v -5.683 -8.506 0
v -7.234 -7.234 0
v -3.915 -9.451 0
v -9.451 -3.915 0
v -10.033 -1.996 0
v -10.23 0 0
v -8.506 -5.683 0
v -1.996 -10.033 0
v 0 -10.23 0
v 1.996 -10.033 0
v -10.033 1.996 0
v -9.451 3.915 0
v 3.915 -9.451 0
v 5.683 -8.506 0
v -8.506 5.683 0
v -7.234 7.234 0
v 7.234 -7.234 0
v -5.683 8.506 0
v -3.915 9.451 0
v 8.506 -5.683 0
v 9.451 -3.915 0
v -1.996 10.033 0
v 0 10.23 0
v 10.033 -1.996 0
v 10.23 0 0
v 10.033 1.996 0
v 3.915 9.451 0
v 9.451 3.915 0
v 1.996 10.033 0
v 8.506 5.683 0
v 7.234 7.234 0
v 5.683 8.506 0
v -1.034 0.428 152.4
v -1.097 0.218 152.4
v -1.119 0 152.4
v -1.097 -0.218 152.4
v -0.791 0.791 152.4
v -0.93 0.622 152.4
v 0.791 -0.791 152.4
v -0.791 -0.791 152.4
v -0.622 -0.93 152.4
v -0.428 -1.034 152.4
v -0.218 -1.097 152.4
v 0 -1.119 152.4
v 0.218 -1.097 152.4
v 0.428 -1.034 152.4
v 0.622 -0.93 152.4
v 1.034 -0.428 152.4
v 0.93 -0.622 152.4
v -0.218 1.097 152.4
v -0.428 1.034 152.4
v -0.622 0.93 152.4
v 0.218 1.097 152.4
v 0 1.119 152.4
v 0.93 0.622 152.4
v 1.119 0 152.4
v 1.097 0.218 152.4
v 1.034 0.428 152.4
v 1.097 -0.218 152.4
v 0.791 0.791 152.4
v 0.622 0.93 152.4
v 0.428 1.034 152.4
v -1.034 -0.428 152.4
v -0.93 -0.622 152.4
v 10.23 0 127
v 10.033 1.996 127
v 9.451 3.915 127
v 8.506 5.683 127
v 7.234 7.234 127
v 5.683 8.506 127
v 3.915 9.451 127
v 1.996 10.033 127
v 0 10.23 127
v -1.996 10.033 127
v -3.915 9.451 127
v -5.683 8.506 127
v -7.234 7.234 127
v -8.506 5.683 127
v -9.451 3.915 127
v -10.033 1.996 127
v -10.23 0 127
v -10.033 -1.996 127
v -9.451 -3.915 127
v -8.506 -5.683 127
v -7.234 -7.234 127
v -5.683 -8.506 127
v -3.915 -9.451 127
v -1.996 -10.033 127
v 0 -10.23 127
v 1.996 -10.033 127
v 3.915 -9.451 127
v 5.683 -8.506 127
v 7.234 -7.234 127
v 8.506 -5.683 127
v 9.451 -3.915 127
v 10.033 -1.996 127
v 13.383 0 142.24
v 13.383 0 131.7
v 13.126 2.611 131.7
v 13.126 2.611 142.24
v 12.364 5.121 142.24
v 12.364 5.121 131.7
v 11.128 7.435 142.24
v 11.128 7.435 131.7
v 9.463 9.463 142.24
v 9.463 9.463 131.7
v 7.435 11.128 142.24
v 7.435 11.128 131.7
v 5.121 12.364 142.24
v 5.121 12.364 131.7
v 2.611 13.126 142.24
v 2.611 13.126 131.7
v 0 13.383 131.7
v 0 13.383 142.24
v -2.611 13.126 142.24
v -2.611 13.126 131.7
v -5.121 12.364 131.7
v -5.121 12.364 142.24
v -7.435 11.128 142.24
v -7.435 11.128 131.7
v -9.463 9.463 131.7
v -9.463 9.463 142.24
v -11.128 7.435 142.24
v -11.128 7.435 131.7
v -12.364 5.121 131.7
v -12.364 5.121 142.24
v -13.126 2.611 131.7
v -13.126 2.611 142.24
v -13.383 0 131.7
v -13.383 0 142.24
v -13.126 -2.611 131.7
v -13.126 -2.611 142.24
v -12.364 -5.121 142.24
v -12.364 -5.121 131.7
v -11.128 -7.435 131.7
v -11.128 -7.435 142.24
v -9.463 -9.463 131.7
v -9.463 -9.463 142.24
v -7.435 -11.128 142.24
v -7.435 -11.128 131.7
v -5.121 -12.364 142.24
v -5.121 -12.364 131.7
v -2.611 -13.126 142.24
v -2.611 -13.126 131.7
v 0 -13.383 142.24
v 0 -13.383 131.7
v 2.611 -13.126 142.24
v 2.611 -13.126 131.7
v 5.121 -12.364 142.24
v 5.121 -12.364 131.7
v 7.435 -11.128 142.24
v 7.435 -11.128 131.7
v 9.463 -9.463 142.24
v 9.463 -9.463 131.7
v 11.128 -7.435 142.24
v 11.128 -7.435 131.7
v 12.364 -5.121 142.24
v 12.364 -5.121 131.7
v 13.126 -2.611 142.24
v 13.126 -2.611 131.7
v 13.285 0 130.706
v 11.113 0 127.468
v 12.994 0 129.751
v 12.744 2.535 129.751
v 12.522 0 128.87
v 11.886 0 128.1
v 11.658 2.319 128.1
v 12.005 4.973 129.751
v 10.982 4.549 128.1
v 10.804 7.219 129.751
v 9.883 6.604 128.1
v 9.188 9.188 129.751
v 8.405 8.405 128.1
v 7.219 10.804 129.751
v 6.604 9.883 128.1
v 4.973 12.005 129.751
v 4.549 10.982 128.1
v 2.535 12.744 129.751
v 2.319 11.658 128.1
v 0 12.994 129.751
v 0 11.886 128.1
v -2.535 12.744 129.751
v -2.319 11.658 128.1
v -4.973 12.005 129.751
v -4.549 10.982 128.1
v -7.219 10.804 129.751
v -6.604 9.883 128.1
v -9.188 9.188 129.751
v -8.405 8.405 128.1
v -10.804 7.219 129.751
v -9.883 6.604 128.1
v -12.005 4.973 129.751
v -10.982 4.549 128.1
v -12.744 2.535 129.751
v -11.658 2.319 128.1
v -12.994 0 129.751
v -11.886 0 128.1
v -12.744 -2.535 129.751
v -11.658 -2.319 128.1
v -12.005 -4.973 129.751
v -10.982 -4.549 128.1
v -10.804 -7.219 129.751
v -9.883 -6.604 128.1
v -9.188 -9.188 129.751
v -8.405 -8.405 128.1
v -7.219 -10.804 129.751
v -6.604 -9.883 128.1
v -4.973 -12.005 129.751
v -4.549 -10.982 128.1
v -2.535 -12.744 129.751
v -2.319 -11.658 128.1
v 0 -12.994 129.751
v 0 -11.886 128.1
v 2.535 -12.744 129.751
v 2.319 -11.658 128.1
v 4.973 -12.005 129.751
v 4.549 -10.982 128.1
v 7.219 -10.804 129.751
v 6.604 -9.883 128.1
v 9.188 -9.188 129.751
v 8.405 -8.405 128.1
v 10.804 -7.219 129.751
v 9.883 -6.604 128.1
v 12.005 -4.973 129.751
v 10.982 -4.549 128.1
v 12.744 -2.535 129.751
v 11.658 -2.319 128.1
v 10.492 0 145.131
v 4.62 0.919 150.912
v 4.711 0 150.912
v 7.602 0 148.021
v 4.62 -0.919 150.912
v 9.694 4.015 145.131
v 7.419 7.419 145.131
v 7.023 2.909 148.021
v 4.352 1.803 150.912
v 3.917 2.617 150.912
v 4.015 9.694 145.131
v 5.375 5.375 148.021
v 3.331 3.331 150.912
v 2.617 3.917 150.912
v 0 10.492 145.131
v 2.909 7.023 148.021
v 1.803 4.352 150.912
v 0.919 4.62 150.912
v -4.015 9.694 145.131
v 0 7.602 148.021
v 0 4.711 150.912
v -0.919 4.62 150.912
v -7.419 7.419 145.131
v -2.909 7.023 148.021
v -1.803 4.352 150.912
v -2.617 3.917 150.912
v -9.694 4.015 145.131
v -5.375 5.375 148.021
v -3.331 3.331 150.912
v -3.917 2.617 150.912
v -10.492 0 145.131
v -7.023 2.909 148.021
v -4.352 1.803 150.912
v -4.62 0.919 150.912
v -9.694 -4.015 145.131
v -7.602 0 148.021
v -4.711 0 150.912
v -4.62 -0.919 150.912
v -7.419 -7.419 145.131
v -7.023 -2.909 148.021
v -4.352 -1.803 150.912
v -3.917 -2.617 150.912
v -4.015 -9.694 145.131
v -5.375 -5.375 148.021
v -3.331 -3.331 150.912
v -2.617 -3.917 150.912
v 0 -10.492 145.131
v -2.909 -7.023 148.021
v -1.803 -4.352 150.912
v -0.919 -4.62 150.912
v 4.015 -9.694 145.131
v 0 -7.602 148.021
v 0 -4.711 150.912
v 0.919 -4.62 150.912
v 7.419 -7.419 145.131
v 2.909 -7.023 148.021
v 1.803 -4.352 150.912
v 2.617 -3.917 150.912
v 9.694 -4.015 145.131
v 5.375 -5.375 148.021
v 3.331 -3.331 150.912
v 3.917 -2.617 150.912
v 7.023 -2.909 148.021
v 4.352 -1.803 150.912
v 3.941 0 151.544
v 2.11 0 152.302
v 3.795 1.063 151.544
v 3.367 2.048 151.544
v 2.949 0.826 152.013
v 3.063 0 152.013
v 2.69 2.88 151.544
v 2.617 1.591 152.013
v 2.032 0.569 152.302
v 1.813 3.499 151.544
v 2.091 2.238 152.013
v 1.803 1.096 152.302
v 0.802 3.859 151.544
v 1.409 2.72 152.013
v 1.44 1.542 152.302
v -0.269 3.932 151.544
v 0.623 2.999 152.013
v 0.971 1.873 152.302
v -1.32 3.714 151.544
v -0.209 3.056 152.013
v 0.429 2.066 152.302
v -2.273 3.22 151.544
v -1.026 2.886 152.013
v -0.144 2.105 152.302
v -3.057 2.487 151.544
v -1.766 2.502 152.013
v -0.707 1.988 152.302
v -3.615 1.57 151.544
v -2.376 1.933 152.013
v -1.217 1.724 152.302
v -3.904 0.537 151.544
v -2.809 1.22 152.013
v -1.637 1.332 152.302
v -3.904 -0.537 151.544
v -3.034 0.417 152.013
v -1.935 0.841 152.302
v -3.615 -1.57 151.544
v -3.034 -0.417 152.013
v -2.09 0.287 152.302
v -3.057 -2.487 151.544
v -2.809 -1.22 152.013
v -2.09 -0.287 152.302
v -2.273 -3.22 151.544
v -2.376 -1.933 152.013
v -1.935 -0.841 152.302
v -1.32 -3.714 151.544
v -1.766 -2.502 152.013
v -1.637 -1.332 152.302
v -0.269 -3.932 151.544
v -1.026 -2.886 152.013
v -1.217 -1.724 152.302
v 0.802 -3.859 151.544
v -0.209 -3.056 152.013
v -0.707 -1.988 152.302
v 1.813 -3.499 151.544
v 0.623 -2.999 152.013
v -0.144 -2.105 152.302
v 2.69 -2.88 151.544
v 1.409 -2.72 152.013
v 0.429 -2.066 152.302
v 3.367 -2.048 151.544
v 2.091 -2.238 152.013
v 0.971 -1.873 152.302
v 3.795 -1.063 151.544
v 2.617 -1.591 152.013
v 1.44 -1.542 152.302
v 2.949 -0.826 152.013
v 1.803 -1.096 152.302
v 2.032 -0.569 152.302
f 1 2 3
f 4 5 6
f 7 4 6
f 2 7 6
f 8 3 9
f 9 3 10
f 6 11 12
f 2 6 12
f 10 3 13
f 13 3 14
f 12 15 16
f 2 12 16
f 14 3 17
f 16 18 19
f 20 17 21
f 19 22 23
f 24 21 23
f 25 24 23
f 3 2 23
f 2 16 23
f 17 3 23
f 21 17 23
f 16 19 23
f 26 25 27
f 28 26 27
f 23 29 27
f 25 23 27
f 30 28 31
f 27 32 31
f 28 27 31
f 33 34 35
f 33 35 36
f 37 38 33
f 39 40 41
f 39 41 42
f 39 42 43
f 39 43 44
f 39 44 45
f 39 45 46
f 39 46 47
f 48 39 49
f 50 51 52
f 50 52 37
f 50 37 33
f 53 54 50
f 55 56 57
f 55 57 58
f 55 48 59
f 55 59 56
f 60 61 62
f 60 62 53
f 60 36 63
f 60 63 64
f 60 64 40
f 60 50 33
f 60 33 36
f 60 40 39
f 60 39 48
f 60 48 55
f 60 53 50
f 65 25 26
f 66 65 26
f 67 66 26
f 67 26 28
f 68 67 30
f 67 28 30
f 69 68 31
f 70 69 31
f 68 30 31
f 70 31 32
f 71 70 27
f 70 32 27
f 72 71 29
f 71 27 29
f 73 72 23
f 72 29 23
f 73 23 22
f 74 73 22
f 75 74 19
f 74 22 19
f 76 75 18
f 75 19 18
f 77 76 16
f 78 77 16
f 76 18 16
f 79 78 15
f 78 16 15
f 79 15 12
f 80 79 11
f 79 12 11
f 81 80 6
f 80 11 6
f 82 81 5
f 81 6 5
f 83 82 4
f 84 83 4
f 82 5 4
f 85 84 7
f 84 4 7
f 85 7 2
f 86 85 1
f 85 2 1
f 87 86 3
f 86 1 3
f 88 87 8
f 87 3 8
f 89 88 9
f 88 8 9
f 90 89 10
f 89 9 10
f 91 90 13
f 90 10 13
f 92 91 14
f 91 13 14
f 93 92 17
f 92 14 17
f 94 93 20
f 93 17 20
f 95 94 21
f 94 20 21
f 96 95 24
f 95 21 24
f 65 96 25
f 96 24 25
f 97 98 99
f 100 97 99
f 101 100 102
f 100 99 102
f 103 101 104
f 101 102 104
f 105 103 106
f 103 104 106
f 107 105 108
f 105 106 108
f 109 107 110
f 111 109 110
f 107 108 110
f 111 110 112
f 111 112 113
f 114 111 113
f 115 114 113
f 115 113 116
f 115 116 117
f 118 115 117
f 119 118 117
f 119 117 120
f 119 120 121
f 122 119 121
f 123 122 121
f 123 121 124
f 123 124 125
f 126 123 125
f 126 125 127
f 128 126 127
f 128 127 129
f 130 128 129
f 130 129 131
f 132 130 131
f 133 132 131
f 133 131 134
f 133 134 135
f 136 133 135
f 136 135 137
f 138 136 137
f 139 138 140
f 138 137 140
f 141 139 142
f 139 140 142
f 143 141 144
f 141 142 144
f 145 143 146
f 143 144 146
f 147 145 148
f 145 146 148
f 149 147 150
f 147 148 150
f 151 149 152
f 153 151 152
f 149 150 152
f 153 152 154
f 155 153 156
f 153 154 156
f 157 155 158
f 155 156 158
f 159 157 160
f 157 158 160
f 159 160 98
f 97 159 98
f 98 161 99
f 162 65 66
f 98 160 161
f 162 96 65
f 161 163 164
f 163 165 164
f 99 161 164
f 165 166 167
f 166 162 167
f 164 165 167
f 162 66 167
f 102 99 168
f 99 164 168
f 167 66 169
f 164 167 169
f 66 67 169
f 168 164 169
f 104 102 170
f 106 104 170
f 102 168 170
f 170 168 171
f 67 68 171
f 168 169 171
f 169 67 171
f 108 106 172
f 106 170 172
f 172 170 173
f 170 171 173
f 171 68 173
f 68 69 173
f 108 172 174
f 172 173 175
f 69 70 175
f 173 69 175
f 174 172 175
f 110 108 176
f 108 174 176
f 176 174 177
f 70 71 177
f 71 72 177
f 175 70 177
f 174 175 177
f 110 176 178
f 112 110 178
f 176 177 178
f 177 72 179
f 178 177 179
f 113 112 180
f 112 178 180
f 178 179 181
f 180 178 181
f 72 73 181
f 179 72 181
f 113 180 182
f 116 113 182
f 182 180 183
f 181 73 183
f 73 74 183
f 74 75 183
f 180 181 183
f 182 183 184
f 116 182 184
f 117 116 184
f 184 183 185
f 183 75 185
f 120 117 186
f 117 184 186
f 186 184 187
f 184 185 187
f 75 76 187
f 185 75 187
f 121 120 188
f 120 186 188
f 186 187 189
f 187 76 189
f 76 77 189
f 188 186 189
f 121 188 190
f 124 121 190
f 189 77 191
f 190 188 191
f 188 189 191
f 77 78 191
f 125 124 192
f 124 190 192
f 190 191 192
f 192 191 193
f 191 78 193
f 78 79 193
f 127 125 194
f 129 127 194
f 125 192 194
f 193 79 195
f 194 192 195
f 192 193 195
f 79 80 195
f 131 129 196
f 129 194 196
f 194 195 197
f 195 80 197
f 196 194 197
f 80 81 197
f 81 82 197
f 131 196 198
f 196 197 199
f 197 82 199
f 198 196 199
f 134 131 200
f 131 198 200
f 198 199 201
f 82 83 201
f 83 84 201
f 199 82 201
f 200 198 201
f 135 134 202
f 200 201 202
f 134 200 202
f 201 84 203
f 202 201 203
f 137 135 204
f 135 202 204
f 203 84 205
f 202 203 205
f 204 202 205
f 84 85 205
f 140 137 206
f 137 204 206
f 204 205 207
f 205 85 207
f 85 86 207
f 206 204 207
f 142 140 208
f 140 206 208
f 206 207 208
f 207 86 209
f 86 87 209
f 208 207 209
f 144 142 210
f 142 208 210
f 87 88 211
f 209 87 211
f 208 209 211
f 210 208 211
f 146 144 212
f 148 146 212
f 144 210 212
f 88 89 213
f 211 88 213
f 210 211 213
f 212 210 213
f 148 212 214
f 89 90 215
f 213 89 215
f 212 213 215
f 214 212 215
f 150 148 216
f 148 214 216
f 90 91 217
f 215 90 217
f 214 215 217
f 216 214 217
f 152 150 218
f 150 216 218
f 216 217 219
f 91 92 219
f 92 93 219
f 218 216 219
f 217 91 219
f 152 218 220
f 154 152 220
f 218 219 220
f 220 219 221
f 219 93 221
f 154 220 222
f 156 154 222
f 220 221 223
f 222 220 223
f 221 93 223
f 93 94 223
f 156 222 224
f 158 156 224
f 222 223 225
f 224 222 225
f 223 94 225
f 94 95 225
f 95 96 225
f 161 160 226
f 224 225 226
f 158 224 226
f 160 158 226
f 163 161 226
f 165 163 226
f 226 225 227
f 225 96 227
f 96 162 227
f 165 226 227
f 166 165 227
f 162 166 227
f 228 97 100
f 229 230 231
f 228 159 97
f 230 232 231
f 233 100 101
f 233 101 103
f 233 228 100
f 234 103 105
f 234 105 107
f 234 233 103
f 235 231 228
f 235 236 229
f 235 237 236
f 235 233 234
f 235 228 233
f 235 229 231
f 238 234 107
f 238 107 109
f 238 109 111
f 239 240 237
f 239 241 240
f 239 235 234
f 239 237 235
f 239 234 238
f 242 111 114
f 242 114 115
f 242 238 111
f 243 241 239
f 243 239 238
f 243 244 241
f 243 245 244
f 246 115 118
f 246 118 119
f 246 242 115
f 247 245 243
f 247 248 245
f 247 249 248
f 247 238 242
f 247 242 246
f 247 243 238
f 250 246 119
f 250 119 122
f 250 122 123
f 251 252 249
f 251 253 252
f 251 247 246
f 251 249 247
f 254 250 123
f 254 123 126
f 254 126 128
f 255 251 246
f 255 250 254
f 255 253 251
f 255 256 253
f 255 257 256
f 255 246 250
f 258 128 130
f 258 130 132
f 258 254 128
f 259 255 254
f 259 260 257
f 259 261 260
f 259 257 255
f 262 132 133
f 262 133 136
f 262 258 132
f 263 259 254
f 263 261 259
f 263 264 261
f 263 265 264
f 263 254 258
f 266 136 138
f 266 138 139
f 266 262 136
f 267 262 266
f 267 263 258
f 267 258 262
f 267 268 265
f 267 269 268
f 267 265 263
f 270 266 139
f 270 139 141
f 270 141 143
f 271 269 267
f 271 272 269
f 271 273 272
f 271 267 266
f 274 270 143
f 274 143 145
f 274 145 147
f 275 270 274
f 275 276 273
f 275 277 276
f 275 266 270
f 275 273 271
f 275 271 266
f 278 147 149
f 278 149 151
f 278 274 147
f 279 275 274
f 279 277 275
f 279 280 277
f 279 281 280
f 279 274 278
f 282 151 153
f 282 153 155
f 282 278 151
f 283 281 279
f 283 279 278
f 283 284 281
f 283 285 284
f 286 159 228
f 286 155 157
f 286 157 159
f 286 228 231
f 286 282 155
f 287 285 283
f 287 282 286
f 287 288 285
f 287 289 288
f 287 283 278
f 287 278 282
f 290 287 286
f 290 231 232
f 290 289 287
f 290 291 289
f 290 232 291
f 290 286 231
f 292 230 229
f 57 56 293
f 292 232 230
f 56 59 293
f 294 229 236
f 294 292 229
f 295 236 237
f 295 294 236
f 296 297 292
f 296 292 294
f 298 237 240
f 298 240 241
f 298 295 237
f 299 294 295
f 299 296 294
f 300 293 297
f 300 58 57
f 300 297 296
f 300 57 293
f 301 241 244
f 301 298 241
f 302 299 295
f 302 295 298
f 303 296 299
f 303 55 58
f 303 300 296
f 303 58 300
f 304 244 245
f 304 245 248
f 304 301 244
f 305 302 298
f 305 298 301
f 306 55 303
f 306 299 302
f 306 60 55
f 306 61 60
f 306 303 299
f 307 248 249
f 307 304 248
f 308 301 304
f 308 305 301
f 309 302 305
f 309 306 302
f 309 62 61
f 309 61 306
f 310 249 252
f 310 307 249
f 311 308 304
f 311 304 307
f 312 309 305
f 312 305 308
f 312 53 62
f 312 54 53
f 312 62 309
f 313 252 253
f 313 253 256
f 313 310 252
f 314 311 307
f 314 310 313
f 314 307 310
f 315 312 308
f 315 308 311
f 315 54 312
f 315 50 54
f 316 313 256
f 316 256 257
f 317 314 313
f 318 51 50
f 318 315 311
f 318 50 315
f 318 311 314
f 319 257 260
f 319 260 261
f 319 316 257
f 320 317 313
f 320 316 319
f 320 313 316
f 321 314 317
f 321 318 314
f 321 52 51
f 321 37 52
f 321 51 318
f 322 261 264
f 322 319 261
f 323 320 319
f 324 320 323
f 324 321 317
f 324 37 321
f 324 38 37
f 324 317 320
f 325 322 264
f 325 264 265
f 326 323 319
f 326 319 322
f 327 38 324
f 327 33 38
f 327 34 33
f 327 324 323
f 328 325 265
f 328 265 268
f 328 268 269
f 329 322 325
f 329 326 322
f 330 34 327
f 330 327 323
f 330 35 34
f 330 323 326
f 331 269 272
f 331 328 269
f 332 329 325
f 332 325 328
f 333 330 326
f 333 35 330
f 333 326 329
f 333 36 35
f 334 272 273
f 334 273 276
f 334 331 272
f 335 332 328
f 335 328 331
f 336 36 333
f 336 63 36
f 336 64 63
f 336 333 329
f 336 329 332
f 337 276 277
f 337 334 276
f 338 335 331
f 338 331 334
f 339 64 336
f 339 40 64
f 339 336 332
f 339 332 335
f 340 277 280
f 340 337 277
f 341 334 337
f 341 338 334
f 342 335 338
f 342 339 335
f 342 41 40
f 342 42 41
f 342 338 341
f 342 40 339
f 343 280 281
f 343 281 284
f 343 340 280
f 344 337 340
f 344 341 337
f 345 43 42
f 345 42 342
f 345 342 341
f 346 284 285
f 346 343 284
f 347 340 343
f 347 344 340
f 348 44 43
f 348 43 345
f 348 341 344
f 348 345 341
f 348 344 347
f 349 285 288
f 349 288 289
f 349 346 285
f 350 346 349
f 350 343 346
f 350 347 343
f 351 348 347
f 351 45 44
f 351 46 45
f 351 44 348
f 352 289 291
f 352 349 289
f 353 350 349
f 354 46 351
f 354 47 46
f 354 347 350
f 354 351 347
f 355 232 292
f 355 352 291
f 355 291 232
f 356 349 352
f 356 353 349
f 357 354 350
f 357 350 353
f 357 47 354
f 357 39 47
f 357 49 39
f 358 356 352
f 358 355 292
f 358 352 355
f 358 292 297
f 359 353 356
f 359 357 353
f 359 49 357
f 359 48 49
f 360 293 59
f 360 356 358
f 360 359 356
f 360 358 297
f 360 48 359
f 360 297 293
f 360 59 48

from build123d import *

# Parameters (mm, degrees)
F4_R     = 10.2299469816
F0_DEPTH = 127
F1_R     = 13.3830980952
F5_DEPTH = 25.4
F3_SIZE  = 10.16
F6_R     = 5.08


# Not quite as in the source:
# - a fillet or chamfer that OpenCascade refuses, or shapes differently, is made with other operations: its cross-section is extruded or revolved along the edge and cut away or added


with BuildPart() as f0:
    # F4 (on Top) → F0 (new body)
    with BuildSketch(Plane.XY):
        Circle(F4_R)
    extrude(amount=F0_DEPTH)

    # F1 (on face) → F5 (join)
    with BuildSketch(Plane.XY.offset(127)):
        Circle(F1_R)
    extrude(amount=F5_DEPTH)

    # F2: fillet of radius 5.08 on 1 edges, made by hand

    # F2_s1 → F2_t2 (revolve, cut)
    with BuildSketch(Plane.XZ):
        with BuildLine():
            ThreePointArc((13.3830980952, 131.7003886402), (12.5217941226, 128.870370296), (10.2299469816, 127))
            Line((10.2299469816, 127), (13.3830980952, 127))
            Line((13.3830980952, 127), (13.3830980952, 131.7003886402))
        make_face()
    revolve(axis=Axis((0, 0, 127), (0, 0, 1)), mode=Mode.SUBTRACT)

    # F3
    f3_edges = [f0.edges().sort_by_distance(p)[0] for p in [
        (-13.383098, 0, 152.4),
    ]]
    chamfer(f3_edges, length=F3_SIZE)

    # F6
    f6_edges = [f0.edges().sort_by_distance(p)[0] for p in [
        (-3.223098, 0, 152.4),
    ]]
    fillet(f6_edges, radius=F6_R)


solid = f0.part
